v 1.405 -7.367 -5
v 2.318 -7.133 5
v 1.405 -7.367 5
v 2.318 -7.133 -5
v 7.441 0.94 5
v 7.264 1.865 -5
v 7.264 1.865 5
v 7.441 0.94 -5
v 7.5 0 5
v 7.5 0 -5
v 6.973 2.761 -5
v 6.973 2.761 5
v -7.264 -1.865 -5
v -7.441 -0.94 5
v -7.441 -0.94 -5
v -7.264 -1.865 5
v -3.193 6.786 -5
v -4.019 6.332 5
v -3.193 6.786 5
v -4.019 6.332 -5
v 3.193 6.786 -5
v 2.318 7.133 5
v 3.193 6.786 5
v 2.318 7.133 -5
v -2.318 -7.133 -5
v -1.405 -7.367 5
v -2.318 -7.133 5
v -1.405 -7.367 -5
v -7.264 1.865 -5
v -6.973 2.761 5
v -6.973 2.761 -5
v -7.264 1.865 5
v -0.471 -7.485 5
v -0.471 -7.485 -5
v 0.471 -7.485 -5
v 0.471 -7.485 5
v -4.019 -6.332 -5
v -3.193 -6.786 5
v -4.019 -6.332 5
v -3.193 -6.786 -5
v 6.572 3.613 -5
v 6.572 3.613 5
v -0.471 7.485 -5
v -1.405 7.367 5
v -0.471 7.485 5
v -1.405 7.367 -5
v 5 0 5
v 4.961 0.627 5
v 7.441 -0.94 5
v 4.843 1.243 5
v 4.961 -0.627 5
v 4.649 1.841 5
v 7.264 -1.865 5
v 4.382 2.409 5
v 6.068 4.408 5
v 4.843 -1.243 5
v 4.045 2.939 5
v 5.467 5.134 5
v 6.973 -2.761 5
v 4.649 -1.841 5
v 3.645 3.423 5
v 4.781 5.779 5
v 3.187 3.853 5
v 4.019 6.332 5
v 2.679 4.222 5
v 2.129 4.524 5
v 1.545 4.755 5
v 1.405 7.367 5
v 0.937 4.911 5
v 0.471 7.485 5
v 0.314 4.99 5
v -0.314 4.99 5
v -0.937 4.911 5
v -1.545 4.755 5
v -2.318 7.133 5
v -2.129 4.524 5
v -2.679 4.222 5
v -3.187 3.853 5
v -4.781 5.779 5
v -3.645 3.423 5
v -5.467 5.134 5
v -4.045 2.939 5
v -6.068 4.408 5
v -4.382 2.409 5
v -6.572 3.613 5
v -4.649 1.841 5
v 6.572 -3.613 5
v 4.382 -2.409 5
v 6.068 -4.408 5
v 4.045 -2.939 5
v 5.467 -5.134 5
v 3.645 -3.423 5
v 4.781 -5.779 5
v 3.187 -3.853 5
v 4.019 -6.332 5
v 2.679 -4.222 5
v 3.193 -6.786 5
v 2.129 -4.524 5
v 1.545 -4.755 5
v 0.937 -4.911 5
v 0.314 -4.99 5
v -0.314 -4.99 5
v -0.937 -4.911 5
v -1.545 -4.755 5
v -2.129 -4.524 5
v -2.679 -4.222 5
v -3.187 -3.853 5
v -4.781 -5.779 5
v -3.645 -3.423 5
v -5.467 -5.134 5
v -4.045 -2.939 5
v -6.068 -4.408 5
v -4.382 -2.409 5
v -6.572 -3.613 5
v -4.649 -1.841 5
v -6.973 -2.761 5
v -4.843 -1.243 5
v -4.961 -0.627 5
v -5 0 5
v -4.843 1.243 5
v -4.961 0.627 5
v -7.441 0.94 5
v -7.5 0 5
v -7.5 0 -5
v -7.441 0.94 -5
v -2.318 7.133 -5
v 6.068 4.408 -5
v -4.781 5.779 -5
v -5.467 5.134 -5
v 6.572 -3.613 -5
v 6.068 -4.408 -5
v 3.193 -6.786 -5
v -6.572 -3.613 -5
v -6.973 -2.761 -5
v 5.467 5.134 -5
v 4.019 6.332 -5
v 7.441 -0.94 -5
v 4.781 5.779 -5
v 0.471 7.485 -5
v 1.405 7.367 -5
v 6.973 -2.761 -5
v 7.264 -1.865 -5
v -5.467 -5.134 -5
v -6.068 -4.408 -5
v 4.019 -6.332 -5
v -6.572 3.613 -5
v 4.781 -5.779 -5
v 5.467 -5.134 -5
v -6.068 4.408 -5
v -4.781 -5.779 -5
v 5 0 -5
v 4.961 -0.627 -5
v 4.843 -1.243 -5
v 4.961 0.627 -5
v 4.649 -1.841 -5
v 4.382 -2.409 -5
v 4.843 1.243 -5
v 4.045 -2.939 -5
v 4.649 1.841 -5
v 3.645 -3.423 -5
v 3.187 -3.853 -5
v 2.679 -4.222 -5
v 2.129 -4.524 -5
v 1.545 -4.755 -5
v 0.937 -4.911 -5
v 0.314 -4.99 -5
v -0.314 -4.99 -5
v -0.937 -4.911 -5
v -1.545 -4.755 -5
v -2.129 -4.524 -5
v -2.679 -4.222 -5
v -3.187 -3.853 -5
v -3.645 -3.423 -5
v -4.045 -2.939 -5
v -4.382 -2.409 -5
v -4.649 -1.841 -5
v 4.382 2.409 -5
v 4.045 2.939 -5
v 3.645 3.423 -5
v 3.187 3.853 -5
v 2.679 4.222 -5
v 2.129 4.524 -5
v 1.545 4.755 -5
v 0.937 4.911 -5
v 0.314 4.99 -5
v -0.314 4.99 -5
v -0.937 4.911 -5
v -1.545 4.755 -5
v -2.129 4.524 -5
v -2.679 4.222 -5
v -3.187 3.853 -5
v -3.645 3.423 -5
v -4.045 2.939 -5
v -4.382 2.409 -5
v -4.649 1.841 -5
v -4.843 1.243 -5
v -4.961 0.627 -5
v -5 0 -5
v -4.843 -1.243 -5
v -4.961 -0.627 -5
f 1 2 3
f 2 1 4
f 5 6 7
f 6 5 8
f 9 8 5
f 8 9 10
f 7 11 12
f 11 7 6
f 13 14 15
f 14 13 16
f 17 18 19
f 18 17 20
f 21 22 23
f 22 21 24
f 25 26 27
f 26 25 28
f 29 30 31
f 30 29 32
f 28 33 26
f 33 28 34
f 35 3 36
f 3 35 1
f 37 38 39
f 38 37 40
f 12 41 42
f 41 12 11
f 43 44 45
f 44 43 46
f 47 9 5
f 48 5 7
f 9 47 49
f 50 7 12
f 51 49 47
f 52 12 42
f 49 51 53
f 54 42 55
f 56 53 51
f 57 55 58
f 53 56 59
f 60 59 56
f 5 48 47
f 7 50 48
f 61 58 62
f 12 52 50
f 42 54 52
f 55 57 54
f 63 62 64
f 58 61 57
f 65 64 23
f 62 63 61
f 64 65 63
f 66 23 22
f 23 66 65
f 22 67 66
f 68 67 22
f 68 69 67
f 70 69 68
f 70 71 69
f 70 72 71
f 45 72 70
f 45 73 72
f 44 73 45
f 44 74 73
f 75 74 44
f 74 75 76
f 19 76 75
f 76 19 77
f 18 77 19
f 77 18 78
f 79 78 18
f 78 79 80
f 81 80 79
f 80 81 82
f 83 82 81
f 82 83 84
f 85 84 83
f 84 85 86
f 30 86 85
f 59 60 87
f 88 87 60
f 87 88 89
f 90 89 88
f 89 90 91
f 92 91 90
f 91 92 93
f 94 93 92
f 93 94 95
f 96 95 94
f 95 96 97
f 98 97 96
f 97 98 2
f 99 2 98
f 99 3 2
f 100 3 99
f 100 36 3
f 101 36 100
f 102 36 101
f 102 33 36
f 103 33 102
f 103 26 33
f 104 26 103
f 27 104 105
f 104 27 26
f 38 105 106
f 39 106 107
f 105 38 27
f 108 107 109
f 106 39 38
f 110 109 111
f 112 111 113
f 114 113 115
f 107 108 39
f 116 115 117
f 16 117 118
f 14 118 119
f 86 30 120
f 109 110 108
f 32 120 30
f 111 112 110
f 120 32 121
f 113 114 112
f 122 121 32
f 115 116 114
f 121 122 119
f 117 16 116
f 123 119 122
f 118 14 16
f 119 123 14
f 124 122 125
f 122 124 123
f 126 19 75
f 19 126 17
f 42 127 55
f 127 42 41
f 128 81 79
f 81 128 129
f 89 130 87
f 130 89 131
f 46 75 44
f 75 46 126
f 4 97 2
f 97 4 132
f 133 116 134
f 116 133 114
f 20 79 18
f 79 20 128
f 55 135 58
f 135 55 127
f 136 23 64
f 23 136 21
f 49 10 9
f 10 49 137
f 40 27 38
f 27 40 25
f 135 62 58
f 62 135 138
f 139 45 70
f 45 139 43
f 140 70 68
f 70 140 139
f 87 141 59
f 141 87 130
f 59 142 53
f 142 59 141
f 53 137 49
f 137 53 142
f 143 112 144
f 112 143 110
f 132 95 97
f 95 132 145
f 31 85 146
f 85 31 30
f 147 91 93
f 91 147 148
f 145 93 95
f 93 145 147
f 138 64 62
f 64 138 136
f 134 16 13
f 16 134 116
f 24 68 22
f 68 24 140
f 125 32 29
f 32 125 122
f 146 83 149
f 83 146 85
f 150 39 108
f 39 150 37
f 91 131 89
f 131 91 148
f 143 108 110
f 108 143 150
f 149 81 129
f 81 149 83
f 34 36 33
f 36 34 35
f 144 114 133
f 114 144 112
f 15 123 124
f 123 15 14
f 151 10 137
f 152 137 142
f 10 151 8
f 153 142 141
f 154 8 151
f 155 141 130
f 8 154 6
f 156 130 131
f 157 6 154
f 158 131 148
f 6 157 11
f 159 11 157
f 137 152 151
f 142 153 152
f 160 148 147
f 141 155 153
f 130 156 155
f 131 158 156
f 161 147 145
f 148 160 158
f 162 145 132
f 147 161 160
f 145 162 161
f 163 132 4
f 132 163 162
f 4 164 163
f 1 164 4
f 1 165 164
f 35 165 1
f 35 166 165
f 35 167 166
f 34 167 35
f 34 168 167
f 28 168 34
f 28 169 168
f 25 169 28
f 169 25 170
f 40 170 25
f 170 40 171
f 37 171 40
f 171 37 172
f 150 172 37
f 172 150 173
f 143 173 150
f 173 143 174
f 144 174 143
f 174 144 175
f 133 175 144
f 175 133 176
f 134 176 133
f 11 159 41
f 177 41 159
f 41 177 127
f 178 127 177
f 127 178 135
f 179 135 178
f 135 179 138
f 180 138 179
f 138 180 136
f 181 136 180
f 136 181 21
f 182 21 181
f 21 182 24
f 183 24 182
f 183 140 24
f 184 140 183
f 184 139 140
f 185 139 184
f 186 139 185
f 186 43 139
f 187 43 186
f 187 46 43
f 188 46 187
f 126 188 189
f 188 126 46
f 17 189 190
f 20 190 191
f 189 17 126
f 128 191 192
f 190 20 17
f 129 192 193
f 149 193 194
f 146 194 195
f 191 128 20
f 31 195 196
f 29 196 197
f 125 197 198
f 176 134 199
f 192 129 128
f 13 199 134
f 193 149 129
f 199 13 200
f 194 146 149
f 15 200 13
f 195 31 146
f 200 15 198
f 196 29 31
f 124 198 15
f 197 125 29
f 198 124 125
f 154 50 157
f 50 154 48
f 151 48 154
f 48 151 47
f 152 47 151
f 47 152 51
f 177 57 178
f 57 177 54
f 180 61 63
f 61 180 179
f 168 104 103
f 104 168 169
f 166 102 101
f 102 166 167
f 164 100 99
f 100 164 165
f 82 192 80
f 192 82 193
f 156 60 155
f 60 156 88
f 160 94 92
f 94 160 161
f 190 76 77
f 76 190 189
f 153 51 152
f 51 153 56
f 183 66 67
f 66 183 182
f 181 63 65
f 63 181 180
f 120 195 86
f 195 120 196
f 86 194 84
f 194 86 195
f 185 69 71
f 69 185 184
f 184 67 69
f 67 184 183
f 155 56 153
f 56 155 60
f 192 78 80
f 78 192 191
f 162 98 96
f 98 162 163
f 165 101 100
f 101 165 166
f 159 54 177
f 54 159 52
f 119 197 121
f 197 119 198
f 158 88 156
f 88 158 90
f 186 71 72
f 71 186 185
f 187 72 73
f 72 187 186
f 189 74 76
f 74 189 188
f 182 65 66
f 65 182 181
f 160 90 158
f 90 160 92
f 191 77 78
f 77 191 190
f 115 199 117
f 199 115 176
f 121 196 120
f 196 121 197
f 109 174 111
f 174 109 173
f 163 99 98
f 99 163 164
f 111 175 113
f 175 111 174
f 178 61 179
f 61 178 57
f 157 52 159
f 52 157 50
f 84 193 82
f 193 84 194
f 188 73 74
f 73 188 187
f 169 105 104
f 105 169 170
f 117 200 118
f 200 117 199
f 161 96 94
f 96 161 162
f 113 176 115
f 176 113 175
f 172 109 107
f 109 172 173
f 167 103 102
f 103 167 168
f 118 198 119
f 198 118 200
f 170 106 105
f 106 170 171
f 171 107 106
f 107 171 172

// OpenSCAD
$fn = 50;


difference() {
	union() {
		translate(v = [0, 0, -5.0000000000]) {
			cylinder(h = 10, r = 7.5000000000);
		}
	}
	union() {
		translate(v = [0, 0, -100.0000000000]) {
			cylinder(h = 200, r = 5.0000000000);
		}
	}
}
